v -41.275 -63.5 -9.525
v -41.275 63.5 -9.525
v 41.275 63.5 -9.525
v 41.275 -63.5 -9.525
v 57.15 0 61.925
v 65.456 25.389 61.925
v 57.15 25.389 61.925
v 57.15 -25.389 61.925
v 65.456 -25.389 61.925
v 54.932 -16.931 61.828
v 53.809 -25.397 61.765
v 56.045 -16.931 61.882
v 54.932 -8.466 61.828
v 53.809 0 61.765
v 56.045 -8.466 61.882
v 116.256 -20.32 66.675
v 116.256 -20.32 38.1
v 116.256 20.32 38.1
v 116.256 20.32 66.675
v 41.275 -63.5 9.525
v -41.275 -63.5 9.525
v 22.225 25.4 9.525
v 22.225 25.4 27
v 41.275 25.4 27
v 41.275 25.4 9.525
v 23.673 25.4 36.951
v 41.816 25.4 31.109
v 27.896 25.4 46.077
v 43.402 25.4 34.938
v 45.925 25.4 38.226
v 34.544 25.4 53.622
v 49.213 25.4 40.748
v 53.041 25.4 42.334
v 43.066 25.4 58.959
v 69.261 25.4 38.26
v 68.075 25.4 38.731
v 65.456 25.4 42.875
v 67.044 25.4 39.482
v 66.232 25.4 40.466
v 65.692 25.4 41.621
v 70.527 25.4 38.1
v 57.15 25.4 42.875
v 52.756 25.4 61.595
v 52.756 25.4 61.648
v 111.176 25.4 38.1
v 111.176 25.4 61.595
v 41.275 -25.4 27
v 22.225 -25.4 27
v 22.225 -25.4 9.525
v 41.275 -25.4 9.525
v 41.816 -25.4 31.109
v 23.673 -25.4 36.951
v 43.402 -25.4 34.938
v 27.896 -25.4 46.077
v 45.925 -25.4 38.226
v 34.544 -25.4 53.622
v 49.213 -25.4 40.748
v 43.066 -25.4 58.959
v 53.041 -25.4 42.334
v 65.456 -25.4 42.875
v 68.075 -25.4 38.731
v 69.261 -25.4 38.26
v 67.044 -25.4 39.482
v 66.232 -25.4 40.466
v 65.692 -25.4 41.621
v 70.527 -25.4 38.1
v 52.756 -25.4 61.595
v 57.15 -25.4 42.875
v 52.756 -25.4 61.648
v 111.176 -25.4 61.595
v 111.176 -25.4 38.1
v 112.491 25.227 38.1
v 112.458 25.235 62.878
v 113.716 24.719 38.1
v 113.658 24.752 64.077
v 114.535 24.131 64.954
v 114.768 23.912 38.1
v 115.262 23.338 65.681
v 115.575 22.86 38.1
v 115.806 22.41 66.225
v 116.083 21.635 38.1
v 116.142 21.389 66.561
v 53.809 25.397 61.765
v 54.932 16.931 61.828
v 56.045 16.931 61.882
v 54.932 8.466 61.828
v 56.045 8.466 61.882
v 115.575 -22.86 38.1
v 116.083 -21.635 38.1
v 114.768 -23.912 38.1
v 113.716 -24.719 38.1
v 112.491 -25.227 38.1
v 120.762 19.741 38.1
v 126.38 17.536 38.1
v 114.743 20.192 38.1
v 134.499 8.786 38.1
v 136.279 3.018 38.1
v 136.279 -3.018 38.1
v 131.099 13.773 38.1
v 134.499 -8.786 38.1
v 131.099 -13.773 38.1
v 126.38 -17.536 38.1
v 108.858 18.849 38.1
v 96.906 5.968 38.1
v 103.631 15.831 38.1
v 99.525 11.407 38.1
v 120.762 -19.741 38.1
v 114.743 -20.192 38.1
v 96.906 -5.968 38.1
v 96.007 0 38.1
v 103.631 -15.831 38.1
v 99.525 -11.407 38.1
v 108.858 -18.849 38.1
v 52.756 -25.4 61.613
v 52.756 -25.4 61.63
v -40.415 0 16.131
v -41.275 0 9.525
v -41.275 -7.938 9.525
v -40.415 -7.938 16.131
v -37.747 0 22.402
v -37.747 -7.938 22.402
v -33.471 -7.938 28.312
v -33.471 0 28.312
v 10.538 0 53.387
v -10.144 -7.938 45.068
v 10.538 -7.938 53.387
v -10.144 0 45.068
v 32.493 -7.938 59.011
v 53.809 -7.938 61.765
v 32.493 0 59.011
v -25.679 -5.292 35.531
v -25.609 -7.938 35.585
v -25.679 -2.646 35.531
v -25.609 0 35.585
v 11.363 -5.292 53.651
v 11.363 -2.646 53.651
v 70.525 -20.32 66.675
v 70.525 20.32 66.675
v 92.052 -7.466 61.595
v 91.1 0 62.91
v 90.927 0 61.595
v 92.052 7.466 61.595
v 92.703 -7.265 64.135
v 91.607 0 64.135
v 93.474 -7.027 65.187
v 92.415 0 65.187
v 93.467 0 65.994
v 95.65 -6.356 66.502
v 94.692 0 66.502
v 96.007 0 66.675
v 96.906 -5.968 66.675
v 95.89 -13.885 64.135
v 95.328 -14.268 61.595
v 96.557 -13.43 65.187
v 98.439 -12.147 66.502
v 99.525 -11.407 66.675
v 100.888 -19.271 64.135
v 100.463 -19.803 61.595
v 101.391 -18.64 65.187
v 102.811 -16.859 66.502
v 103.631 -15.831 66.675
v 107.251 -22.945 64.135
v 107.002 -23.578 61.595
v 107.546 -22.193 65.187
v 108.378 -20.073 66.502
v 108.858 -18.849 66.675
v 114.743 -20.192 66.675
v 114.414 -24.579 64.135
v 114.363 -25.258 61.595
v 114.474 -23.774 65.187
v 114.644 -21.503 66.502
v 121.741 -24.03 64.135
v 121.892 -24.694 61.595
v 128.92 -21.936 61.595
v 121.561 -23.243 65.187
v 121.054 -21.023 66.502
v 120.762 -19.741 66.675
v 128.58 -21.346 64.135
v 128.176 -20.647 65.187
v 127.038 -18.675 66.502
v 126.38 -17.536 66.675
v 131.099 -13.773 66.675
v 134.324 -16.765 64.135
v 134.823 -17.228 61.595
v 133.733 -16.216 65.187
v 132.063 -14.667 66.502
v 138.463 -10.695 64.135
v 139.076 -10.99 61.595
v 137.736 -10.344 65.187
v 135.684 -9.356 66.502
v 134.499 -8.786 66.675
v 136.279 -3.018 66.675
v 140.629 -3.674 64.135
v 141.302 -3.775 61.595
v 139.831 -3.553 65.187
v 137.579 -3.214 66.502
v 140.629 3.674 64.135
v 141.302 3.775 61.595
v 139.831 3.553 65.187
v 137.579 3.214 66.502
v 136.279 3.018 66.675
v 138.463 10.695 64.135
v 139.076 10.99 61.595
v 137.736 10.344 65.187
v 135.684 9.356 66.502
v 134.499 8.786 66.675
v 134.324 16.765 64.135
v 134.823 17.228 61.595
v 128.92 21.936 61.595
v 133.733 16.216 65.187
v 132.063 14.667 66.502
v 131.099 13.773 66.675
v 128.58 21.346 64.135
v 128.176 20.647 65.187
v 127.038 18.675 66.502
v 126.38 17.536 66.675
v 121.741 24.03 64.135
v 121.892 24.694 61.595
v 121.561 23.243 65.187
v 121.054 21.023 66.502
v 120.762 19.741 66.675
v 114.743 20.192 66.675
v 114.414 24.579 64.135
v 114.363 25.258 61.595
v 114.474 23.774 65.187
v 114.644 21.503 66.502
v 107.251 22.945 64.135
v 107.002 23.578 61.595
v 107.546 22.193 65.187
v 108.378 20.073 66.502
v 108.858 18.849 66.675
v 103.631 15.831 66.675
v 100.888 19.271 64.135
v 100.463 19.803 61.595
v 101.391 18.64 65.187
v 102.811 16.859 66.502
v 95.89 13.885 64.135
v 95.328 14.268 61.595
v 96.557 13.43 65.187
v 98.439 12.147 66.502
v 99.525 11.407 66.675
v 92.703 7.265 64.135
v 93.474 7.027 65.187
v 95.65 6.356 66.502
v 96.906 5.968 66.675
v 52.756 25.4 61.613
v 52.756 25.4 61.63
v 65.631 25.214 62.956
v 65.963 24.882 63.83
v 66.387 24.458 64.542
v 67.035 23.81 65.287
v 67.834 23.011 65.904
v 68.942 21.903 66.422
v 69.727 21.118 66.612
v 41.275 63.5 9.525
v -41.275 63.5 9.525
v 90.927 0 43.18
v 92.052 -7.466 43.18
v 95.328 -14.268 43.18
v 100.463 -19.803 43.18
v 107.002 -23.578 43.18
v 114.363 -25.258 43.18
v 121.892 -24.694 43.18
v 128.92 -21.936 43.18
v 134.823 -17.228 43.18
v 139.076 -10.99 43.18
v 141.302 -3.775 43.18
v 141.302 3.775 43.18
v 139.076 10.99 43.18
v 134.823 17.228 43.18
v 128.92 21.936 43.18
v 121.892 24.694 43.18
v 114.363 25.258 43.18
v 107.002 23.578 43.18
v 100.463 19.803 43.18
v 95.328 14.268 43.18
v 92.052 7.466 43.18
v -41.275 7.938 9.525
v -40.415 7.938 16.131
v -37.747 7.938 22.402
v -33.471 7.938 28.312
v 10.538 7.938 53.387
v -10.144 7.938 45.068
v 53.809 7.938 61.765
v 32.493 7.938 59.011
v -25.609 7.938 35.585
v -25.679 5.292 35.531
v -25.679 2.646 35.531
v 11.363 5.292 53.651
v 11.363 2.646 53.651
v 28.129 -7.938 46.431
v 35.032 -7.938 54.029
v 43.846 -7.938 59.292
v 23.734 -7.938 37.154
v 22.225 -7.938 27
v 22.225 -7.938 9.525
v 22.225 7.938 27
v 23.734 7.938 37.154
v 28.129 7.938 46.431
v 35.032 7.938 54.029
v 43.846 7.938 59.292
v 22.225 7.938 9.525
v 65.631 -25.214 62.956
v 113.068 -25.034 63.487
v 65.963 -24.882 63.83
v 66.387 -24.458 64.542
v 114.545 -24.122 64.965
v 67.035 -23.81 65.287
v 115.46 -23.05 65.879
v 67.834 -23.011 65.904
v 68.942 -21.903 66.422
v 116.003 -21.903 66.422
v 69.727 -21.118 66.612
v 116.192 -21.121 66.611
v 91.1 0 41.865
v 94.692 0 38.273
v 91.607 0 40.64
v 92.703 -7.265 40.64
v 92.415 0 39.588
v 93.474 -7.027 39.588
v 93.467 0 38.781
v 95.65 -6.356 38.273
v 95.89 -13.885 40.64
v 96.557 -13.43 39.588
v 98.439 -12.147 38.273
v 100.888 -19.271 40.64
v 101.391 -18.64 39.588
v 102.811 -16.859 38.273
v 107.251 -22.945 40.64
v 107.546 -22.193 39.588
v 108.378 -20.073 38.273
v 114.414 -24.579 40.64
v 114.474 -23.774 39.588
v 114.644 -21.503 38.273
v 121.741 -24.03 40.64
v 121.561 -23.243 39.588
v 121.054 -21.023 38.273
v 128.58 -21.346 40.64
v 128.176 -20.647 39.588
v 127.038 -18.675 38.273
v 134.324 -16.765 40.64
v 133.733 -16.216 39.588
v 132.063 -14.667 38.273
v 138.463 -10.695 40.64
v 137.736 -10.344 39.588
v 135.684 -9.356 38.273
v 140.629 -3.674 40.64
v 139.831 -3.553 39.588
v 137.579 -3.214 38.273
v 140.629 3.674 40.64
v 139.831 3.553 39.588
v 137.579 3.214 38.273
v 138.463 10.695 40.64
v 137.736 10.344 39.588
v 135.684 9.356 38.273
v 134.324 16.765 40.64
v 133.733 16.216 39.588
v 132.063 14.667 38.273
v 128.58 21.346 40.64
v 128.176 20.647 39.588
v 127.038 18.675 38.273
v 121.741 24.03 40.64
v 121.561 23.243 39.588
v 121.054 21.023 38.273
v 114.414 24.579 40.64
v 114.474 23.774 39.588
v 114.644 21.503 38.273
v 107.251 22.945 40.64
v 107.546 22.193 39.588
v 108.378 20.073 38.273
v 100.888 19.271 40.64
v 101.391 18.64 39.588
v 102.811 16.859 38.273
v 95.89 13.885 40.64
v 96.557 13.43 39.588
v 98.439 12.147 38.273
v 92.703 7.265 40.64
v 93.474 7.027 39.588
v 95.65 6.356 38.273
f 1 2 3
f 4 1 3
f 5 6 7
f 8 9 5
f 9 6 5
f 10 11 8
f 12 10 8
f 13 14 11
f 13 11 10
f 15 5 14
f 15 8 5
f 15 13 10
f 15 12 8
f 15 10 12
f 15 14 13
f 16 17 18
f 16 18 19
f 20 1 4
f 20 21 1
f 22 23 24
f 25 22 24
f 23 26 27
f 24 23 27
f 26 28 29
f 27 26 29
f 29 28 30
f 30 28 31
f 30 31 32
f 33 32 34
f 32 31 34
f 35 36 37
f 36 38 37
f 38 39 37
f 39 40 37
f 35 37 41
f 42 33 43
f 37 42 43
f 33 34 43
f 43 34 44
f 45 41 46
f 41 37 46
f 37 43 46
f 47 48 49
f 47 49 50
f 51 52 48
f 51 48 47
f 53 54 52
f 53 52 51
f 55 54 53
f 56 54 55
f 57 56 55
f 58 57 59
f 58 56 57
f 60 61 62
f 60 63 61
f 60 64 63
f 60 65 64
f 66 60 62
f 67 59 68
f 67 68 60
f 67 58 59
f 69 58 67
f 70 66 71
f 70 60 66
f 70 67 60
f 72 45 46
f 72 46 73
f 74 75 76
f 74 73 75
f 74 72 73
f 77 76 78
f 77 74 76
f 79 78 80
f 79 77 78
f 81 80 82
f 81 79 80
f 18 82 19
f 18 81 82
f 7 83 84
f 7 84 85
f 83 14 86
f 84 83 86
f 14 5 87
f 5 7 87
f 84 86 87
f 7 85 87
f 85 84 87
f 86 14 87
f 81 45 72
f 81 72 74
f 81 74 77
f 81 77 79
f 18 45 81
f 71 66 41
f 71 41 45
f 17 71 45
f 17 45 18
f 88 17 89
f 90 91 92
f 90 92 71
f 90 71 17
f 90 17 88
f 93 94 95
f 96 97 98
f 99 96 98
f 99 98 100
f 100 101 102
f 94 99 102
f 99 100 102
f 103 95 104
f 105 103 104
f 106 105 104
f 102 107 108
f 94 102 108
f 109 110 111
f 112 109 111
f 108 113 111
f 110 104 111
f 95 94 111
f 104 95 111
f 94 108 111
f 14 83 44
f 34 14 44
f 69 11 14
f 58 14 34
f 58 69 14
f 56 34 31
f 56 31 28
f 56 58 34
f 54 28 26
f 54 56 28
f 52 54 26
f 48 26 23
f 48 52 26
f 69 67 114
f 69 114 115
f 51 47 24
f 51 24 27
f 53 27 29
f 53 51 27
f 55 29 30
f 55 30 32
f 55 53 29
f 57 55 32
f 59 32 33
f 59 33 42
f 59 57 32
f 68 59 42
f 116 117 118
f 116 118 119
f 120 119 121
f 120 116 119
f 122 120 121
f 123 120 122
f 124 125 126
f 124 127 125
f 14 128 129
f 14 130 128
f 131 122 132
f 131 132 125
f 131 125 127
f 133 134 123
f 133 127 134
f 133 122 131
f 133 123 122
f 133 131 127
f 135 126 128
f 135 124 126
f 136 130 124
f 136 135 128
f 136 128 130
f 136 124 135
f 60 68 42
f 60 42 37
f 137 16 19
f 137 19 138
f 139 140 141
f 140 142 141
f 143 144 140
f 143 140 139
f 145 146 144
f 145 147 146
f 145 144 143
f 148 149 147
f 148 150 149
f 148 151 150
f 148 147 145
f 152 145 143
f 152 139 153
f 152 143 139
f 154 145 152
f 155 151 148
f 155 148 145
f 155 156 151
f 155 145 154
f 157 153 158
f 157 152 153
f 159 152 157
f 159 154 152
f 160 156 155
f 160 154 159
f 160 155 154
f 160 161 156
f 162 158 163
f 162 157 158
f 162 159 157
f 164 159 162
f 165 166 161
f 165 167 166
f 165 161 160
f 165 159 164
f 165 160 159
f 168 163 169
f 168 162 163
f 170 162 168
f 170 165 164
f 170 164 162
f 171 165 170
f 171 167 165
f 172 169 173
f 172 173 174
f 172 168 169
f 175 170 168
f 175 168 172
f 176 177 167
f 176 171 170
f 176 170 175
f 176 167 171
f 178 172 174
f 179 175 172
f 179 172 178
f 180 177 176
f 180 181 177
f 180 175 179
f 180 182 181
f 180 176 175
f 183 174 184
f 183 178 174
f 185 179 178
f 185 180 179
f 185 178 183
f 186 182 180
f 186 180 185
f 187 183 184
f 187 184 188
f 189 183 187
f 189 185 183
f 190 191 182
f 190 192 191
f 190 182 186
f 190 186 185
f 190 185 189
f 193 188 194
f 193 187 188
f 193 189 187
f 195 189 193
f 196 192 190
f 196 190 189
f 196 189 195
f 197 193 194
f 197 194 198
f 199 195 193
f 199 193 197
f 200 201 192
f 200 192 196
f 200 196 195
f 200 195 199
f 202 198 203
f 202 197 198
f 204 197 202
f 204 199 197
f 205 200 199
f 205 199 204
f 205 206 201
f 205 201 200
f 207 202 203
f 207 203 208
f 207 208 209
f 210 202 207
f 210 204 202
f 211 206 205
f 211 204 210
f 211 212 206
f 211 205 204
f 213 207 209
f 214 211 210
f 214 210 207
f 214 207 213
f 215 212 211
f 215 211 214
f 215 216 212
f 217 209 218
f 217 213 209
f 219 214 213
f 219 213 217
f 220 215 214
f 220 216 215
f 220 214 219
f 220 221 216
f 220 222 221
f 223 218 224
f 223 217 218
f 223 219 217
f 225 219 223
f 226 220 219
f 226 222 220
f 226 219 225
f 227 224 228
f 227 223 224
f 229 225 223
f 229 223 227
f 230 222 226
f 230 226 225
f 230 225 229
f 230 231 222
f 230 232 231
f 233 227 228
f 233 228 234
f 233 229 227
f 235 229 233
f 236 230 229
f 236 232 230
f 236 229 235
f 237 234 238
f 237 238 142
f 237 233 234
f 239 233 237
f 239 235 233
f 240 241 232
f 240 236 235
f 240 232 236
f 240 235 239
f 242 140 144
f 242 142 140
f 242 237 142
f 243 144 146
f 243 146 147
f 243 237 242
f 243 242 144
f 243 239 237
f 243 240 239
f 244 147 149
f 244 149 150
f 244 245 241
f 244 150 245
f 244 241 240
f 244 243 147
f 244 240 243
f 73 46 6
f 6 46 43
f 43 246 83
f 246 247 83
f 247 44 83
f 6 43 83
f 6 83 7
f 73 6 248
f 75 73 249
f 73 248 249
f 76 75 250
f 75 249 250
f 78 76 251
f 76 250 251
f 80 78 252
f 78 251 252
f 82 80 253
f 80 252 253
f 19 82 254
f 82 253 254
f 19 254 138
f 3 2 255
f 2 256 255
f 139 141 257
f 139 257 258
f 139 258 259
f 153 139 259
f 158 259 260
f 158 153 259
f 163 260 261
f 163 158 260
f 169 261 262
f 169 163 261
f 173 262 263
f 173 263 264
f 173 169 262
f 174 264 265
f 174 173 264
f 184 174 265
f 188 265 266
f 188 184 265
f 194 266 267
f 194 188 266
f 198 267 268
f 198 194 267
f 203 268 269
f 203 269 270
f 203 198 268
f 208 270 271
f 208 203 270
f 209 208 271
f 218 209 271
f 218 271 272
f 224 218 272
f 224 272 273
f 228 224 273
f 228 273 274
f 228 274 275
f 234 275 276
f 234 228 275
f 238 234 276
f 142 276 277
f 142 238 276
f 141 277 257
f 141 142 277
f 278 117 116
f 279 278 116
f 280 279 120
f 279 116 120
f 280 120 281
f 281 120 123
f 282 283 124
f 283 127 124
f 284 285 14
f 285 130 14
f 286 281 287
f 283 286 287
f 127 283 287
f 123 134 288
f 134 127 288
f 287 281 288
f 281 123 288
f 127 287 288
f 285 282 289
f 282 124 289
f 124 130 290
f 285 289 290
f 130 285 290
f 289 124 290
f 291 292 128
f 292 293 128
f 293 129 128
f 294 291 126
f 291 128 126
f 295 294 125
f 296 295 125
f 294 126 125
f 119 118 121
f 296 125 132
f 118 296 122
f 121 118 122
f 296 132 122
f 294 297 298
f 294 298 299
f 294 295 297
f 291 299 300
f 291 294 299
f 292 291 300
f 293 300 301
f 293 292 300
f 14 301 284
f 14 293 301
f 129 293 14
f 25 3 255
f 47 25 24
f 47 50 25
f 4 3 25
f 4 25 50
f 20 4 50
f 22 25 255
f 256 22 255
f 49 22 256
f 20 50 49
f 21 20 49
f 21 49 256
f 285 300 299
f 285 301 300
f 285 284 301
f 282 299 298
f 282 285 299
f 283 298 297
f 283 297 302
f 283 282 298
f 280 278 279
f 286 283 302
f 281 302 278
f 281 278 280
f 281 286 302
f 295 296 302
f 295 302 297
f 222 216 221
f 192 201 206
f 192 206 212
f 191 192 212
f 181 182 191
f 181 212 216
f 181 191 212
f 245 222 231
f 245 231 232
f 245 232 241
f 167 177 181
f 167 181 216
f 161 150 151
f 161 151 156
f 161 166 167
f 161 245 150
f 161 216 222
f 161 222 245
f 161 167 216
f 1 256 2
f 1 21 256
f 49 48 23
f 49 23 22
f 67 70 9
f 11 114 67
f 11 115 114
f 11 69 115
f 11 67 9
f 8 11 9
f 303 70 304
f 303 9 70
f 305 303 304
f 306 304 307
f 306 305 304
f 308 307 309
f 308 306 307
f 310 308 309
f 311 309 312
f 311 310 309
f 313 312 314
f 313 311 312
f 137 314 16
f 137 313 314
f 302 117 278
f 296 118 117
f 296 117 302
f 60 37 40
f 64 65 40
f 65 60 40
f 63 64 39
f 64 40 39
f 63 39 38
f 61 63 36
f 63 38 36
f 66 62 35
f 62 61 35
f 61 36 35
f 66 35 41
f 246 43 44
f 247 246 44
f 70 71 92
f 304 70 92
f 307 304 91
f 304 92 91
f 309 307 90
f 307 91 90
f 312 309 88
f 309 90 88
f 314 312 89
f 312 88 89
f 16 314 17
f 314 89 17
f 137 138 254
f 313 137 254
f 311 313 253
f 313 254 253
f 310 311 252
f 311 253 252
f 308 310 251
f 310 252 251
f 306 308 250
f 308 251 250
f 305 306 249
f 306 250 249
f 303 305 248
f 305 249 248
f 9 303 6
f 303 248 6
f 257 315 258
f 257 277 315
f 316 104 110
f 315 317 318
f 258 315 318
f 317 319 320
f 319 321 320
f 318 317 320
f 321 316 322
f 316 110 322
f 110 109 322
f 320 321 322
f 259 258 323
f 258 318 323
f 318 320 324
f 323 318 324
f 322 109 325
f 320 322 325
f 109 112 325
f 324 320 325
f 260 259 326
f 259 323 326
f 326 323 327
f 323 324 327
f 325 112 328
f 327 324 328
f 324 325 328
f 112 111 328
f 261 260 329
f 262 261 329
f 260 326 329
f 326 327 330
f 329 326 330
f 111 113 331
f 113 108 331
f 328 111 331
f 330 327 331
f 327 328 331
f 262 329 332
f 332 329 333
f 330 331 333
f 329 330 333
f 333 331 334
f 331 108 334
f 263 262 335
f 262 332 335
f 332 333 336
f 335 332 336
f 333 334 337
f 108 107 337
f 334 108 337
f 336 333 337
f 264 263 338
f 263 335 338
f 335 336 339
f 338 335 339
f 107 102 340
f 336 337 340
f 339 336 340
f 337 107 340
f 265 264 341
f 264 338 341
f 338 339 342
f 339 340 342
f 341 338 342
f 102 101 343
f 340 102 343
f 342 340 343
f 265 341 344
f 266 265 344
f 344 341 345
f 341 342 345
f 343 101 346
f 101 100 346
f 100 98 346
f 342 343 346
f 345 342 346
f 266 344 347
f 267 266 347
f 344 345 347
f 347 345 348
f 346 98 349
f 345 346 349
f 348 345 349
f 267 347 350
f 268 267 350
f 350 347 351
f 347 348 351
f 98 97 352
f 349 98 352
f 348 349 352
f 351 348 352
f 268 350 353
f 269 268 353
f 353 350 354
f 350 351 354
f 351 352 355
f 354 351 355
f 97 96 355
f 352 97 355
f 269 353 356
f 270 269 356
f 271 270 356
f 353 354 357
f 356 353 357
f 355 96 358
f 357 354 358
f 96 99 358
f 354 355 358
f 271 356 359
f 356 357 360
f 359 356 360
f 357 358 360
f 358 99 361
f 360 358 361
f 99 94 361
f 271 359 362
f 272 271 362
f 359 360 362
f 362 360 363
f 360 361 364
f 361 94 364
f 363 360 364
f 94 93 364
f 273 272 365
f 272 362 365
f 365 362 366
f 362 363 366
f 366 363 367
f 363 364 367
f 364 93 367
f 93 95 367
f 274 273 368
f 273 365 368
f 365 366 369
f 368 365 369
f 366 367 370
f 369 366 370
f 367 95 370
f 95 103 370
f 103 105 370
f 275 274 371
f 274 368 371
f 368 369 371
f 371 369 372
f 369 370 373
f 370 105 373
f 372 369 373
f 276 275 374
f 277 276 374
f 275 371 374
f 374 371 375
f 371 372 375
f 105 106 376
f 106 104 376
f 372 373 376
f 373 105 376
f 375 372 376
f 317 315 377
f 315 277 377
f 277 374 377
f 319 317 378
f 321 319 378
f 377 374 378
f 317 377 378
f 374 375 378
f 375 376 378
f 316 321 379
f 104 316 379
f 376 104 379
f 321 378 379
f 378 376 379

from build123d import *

# Parameters (mm, degrees)
F1_DEPTH    = 63.5
F0_W        = 25.3289441975
F0_H        = 28.575
F2_DEPTH    = 25.4
F3_DEPTH    = 7.9375
F5_T1_DEPTH = 76.2
F5_T3_DEPTH = 76.1542387778
F5_T5_DEPTH = 76.1462857042
F5_T7_DEPTH = 53.975
F5_2_F1_R   = 5.08
F5_2_F2_R   = 5.08


# Not quite as in the source:
# - a fillet or chamfer that OpenCascade refuses, or shapes differently, is made with other operations: its cross-section is extruded or revolved along the edge and cut away or added
# - a feature names something its author has since deleted; it is built from what else it names


with BuildPart() as f1:
    # F0 (on Front) → F1 (new body, symmetric)
    with BuildSketch(Plane.XZ):
        Polygon((-41.275, -9.525), (41.275, -9.525), (41.275, 9.525), (22.225, 9.525), (-41.275, 9.525), align=None)
    extrude(amount=F1_DEPTH, both=True)

    # F0 (on Front) → F2 (join, symmetric)
    with BuildSketch(Plane.XZ):
        with BuildLine():
            Line((22.225, 9.525), (41.275, 9.525))
            Line((41.275, 9.525), (41.275, 27.0002))
            ThreePointArc((41.275, 27.0002), (45.9246798487, 38.2255201513), (57.15, 42.8752))
            Line((57.15, 42.8752), (65.4558, 42.8752))
            Line((65.4558, 42.8752), (65.4558, 61.9252))
            Line((65.4558, 61.9252), (57.15, 61.9252))
            add(Edge.make_bspline(
                [(53.808911529, 61.7650206213), (54.9359515, 61.8330740331), (56.0501940999, 61.8865394151), (57.15, 61.9252)],
                knots=[108.4339478208, 108.4339478208, 108.4339478208, 108.4339478208, 111.5045361635, 111.5045361635, 111.5045361635, 111.5045361635], degree=3))
            ThreePointArc((53.808911529, 61.7650206213), (31.3000179899, 50.484962189), (22.225, 27.0002))
            Line((22.225, 27.0002), (22.225, 9.525))
        make_face()
        Polygon((65.4558, 61.9252), (65.4558, 42.8752), (65.4558, 38.1), (90.9268558025, 38.1), (90.9268558025, 66.675), (65.4558, 66.675), align=None)
        with Locations((103.5913279013, 52.3875)):
            Rectangle(F0_W, F0_H)
    extrude(amount=F2_DEPTH, both=True)

    # F5: fillet of radius 5.08 on 6 edges, made by hand

    # F5_s2 → F5_t1 (cut)
    with BuildSketch(Plane.YZ.offset(52.7558)):
        with BuildLine():
            ThreePointArc((25.4, 61.595), (23.9121024484, 65.1871024484), (20.32, 66.675))
            Line((20.32, 66.675), (25.4, 66.675))
            Line((25.4, 66.675), (25.4, 61.595))
        make_face()
        with BuildLine():
            ThreePointArc((-25.4, 61.595), (-23.9121024484, 65.1871024484), (-20.32, 66.675))
            Line((-20.32, 66.675), (-25.4, 66.675))
            Line((-25.4, 66.675), (-25.4, 61.595))
        make_face()
    extrude(amount=F5_T1_DEPTH, mode=Mode.SUBTRACT)

    # F5_s4 → F5_t3 (cut)
    with BuildSketch(Plane.XZ.offset(-38.0771193889)):
        with BuildLine():
            ThreePointArc((65.4558, 42.8752), (67.0439752185, 39.4817041762), (70.5266477556, 38.1))
            Line((70.5266477556, 38.1), (65.4558, 38.1))
            Line((65.4558, 38.1), (65.4558, 42.8752))
        make_face()
    extrude(amount=F5_T3_DEPTH, mode=Mode.SUBTRACT)

    # F5_s6 → F5_t5 (cut)
    with BuildSketch(Plane.XZ.offset(-38.0731428521)):
        with BuildLine():
            ThreePointArc((70.5250571408, 66.675), (67.0516593807, 65.3020079579), (65.4558, 61.9252))
            Line((65.4558, 61.9252), (65.4558, 66.675))
            Line((65.4558, 66.675), (70.5250571408, 66.675))
        make_face()
    extrude(amount=F5_T5_DEPTH, mode=Mode.SUBTRACT)

    # F5_s8 → F5_t7 (cut)
    with BuildSketch(Plane.XY.offset(25.4)):
        with BuildLine():
            ThreePointArc((111.1758, -25.4), (114.7679024484, -23.9121024484), (116.2558, -20.32))
            Line((116.2558, -20.32), (116.2558, -25.4))
            Line((116.2558, -25.4), (111.1758, -25.4))
        make_face()
        with BuildLine():
            ThreePointArc((111.1758, 25.4), (114.7679024484, 23.9121024484), (116.2558, 20.32))
            Line((116.2558, 20.32), (116.2558, 25.4))
            Line((116.2558, 25.4), (111.1758, 25.4))
        make_face()
    extrude(amount=F5_T7_DEPTH, mode=Mode.SUBTRACT)


with BuildPart() as f3:
    # F0 (on Front) → F3 (new body, symmetric)
    with BuildSketch(Plane.XZ):
        with BuildLine():
            add(Edge.make_bspline(
                [(-41.275, 9.525), (-41.7501631131, 38.7664319524), (14.0089189004, 59.3618003655), (53.808911529, 61.7650206213)],
                knots=[0, 0, 0, 0, 108.4339478208, 108.4339478208, 108.4339478208, 108.4339478208], degree=3))
            Line((-41.275, 9.525), (22.225, 9.525))
            Line((22.225, 9.525), (22.225, 27.0002))
            ThreePointArc((22.225, 27.0002), (31.3000179899, 50.484962189), (53.808911529, 61.7650206213))
        make_face()
    extrude(amount=F3_DEPTH, both=True)


with BuildPart() as f4:
    # F0 (on Front) → F4 (revolve)
    with BuildSketch(Plane.XZ):
        with Locations((103.5913279013, 52.3875)):
            Rectangle(F0_W, F0_H)
    revolve(axis=Axis((116.2558, 0, 52.3875), (0, 0, 1)))

    # F5#2: fillet of radius 5.08 on 2 edges, made by hand

    # F5_2_f1
    f5_2_f1_edges = [f4.edges().sort_by_distance(p)[0] for p in [
        (141.5847441975, 0, 66.675),
    ]]
    fillet(f5_2_f1_edges, radius=F5_2_F1_R)

    # F5_2_f2
    f5_2_f2_edges = [f4.edges().sort_by_distance(p)[0] for p in [
        (141.5847441975, 0, 38.1),
    ]]
    fillet(f5_2_f2_edges, radius=F5_2_F2_R)


solid = Compound([f1.part, f3.part, f4.part])
